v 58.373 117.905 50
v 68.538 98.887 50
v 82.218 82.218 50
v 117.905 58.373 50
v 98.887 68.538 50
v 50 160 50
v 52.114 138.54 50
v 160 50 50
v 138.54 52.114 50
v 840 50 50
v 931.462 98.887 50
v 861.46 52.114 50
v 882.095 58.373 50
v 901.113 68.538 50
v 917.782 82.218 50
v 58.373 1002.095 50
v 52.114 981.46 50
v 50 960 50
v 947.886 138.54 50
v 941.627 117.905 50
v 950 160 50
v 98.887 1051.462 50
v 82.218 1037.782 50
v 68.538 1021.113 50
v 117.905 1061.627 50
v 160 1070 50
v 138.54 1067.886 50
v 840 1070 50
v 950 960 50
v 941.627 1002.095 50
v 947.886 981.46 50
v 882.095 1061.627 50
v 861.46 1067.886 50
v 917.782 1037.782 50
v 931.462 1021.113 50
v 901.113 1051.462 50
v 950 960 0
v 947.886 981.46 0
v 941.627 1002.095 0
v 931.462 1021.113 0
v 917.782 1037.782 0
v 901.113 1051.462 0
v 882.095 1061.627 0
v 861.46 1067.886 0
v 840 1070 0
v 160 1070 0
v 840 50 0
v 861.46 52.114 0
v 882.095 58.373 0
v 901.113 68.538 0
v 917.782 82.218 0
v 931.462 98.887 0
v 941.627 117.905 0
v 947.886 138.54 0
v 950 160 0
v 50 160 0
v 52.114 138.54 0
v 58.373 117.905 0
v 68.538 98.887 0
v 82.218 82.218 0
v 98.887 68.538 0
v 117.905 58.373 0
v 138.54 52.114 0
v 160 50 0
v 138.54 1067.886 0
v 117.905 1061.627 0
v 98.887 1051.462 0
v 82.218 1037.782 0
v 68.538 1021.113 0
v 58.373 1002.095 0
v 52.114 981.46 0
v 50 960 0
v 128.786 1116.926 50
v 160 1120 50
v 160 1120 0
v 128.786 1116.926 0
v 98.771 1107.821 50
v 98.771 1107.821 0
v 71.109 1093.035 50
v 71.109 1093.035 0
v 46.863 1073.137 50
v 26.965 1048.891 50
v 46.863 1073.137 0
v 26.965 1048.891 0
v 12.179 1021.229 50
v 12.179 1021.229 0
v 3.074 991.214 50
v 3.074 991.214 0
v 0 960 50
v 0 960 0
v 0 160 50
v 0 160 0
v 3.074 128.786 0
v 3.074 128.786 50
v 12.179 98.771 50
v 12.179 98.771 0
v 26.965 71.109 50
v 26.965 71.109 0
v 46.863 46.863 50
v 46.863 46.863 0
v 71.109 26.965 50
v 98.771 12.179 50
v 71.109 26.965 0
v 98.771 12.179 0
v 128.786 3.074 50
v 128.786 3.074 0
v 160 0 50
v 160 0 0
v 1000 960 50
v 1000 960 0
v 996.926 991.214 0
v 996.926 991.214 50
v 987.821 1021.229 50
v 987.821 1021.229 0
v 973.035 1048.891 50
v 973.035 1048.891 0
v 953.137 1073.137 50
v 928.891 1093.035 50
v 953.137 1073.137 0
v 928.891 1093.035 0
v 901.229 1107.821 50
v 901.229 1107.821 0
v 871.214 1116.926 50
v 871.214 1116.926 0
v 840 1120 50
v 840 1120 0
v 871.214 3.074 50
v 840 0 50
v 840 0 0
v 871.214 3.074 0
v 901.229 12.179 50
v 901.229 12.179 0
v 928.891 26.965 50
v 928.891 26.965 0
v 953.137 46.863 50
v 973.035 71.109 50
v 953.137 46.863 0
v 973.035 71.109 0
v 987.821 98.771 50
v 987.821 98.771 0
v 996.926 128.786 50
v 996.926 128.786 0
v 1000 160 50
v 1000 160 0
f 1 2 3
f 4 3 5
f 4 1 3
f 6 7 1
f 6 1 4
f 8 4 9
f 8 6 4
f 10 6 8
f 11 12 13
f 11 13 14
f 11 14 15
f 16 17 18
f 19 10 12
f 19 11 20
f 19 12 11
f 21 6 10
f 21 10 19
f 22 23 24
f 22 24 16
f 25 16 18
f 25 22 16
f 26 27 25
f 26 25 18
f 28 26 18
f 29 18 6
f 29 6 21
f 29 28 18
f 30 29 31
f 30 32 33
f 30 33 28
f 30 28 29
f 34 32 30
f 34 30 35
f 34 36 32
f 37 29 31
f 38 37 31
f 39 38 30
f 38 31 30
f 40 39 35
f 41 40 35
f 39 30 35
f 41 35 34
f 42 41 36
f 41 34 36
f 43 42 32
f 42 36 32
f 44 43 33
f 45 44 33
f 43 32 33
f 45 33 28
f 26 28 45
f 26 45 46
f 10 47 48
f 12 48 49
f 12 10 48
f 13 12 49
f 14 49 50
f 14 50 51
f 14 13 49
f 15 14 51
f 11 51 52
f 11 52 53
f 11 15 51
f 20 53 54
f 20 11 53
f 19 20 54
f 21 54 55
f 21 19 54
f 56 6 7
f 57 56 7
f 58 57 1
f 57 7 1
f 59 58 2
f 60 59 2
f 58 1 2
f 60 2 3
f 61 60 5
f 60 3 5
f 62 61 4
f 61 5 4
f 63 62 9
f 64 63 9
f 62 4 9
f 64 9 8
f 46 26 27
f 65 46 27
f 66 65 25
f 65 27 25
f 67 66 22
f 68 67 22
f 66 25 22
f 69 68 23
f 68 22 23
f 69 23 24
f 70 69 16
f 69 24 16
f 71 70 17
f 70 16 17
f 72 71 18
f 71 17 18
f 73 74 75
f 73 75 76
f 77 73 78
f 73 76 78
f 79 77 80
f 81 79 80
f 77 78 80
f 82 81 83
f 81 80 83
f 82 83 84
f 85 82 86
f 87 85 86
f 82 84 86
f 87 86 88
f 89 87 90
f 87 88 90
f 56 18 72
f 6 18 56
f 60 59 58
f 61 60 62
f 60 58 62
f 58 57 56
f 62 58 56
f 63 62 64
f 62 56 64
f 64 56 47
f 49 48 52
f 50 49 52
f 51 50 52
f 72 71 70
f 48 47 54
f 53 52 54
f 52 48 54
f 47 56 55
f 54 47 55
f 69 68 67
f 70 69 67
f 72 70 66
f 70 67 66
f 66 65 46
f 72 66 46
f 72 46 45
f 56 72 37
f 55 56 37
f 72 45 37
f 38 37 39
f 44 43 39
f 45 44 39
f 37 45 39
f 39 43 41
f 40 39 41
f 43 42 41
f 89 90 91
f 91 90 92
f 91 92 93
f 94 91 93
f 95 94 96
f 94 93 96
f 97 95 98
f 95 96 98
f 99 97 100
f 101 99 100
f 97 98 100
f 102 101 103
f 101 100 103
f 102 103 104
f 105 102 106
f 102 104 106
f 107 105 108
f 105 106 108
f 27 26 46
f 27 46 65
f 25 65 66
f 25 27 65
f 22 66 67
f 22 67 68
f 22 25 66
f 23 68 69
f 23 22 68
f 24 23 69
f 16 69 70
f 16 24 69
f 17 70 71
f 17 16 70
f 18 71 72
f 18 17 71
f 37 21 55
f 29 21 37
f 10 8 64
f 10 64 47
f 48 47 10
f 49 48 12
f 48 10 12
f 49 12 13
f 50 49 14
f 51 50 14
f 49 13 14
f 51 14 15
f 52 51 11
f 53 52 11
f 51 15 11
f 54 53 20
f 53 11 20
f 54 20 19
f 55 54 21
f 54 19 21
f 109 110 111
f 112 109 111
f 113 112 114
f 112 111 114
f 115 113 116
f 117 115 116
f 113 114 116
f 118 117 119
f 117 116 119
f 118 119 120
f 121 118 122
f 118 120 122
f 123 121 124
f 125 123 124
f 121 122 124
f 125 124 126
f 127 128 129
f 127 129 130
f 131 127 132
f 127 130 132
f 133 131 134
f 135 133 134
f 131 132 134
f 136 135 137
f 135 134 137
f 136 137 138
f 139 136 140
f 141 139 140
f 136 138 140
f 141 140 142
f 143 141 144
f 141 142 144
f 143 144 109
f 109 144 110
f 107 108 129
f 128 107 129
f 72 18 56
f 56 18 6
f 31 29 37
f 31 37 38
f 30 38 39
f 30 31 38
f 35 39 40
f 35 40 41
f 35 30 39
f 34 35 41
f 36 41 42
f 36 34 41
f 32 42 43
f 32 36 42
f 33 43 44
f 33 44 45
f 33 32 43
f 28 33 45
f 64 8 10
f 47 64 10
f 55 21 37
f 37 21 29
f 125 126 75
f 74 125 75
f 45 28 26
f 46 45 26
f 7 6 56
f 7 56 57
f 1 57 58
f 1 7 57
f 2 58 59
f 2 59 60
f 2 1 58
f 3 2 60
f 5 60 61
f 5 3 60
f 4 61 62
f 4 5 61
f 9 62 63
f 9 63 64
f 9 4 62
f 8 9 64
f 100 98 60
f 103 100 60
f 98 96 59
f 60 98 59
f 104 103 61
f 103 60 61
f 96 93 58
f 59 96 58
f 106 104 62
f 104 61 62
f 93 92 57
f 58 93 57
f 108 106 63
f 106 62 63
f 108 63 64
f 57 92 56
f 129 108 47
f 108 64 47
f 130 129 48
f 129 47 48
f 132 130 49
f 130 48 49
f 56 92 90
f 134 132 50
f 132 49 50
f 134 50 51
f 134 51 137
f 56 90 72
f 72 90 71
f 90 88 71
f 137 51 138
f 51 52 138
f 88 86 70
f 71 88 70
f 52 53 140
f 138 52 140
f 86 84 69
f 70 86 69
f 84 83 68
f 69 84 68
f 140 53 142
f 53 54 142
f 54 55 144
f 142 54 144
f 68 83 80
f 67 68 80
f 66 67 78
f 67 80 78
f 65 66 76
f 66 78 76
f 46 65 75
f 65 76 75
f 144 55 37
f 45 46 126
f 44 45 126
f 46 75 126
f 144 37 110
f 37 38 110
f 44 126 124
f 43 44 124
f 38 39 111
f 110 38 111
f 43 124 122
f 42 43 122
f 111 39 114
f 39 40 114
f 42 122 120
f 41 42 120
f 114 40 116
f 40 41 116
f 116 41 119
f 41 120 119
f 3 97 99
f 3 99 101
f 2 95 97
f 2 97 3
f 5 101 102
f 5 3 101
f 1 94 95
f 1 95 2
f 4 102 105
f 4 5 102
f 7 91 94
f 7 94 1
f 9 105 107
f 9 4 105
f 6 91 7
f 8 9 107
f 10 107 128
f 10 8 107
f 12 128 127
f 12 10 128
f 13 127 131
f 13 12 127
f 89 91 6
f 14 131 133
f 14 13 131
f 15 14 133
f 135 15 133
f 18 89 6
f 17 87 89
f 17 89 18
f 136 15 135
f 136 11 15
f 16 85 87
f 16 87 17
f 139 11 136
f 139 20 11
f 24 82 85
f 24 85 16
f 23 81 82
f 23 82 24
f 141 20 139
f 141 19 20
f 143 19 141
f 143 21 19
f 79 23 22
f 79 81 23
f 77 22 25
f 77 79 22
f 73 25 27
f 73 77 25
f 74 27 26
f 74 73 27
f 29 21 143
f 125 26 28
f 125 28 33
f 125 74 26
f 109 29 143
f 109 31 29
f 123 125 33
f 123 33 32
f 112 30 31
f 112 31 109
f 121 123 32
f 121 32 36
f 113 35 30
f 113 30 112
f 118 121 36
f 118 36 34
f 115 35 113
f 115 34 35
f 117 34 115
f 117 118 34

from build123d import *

# Parameters (mm, degrees)
BOSS_EXTRUDE1_DEPTH = 50
CUT_EXTRUDE1_REACH  = 1504.298
BOSS_EXTRUDE3_DEPTH = 50


with BuildPart() as part:
    # Sketch1 → Boss-Extrude1 (new body)
    with BuildSketch(Plane.XY):
        with BuildLine():
            Line((160, 0), (840, 0))
            ThreePointArc((840, 0), (953.13708499, 46.86291501), (1000, 160))
            Line((1000, 160), (1000, 960))
            ThreePointArc((1000, 960), (953.13708499, 1073.13708499), (840, 1120))
            Line((840, 1120), (160, 1120))
            ThreePointArc((160, 1120), (46.86291501, 1073.13708499), (0, 960))
            Line((0, 960), (0, 160))
            ThreePointArc((0, 160), (46.86291501, 46.86291501), (160, 0))
        make_face()
    extrude(amount=BOSS_EXTRUDE1_DEPTH)

    # Sketch3 → Cut-Extrude1 (cut, up to next)
    with BuildSketch(Plane.XY.offset(50), mode=Mode.PRIVATE) as cut_extrude1_sk1:
        with BuildLine():
            Line((160, 50), (840, 50))
            ThreePointArc((840, 50), (917.781745931, 82.218254069), (950, 160))
            Line((950, 160), (950, 960))
            ThreePointArc((950, 960), (917.781745931, 1037.781745931), (840, 1070))
            Line((840, 1070), (160, 1070))
            ThreePointArc((160, 1070), (82.218254069, 1037.781745931), (50, 960))
            Line((50, 960), (50, 160))
            ThreePointArc((50, 160), (82.218254069, 82.218254069), (160, 50))
        make_face()
    cut_extrude1_tool1 = extrude(cut_extrude1_sk1.sketch, amount=-CUT_EXTRUDE1_REACH, mode=Mode.PRIVATE) & part.part
    add(cut_extrude1_tool1.solids().sort_by_distance((500, 560, 50))[0], mode=Mode.SUBTRACT)


with BuildPart() as body_2:
    # Sketch3<2> → Boss-Extrude3 (new body)
    with BuildSketch(Plane.XY.offset(50)):
        with BuildLine():
            Line((160, 50), (840, 50))
            ThreePointArc((840, 50), (917.781745931, 82.218254069), (950, 160))
            Line((950, 160), (950, 960))
            ThreePointArc((950, 960), (917.781745931, 1037.781745931), (840, 1070))
            Line((840, 1070), (160, 1070))
            ThreePointArc((160, 1070), (82.218254069, 1037.781745931), (50, 960))
            Line((50, 960), (50, 160))
            ThreePointArc((50, 160), (82.218254069, 82.218254069), (160, 50))
        make_face()
    extrude(amount=-BOSS_EXTRUDE3_DEPTH)


solid = Compound([part.part, body_2.part])
